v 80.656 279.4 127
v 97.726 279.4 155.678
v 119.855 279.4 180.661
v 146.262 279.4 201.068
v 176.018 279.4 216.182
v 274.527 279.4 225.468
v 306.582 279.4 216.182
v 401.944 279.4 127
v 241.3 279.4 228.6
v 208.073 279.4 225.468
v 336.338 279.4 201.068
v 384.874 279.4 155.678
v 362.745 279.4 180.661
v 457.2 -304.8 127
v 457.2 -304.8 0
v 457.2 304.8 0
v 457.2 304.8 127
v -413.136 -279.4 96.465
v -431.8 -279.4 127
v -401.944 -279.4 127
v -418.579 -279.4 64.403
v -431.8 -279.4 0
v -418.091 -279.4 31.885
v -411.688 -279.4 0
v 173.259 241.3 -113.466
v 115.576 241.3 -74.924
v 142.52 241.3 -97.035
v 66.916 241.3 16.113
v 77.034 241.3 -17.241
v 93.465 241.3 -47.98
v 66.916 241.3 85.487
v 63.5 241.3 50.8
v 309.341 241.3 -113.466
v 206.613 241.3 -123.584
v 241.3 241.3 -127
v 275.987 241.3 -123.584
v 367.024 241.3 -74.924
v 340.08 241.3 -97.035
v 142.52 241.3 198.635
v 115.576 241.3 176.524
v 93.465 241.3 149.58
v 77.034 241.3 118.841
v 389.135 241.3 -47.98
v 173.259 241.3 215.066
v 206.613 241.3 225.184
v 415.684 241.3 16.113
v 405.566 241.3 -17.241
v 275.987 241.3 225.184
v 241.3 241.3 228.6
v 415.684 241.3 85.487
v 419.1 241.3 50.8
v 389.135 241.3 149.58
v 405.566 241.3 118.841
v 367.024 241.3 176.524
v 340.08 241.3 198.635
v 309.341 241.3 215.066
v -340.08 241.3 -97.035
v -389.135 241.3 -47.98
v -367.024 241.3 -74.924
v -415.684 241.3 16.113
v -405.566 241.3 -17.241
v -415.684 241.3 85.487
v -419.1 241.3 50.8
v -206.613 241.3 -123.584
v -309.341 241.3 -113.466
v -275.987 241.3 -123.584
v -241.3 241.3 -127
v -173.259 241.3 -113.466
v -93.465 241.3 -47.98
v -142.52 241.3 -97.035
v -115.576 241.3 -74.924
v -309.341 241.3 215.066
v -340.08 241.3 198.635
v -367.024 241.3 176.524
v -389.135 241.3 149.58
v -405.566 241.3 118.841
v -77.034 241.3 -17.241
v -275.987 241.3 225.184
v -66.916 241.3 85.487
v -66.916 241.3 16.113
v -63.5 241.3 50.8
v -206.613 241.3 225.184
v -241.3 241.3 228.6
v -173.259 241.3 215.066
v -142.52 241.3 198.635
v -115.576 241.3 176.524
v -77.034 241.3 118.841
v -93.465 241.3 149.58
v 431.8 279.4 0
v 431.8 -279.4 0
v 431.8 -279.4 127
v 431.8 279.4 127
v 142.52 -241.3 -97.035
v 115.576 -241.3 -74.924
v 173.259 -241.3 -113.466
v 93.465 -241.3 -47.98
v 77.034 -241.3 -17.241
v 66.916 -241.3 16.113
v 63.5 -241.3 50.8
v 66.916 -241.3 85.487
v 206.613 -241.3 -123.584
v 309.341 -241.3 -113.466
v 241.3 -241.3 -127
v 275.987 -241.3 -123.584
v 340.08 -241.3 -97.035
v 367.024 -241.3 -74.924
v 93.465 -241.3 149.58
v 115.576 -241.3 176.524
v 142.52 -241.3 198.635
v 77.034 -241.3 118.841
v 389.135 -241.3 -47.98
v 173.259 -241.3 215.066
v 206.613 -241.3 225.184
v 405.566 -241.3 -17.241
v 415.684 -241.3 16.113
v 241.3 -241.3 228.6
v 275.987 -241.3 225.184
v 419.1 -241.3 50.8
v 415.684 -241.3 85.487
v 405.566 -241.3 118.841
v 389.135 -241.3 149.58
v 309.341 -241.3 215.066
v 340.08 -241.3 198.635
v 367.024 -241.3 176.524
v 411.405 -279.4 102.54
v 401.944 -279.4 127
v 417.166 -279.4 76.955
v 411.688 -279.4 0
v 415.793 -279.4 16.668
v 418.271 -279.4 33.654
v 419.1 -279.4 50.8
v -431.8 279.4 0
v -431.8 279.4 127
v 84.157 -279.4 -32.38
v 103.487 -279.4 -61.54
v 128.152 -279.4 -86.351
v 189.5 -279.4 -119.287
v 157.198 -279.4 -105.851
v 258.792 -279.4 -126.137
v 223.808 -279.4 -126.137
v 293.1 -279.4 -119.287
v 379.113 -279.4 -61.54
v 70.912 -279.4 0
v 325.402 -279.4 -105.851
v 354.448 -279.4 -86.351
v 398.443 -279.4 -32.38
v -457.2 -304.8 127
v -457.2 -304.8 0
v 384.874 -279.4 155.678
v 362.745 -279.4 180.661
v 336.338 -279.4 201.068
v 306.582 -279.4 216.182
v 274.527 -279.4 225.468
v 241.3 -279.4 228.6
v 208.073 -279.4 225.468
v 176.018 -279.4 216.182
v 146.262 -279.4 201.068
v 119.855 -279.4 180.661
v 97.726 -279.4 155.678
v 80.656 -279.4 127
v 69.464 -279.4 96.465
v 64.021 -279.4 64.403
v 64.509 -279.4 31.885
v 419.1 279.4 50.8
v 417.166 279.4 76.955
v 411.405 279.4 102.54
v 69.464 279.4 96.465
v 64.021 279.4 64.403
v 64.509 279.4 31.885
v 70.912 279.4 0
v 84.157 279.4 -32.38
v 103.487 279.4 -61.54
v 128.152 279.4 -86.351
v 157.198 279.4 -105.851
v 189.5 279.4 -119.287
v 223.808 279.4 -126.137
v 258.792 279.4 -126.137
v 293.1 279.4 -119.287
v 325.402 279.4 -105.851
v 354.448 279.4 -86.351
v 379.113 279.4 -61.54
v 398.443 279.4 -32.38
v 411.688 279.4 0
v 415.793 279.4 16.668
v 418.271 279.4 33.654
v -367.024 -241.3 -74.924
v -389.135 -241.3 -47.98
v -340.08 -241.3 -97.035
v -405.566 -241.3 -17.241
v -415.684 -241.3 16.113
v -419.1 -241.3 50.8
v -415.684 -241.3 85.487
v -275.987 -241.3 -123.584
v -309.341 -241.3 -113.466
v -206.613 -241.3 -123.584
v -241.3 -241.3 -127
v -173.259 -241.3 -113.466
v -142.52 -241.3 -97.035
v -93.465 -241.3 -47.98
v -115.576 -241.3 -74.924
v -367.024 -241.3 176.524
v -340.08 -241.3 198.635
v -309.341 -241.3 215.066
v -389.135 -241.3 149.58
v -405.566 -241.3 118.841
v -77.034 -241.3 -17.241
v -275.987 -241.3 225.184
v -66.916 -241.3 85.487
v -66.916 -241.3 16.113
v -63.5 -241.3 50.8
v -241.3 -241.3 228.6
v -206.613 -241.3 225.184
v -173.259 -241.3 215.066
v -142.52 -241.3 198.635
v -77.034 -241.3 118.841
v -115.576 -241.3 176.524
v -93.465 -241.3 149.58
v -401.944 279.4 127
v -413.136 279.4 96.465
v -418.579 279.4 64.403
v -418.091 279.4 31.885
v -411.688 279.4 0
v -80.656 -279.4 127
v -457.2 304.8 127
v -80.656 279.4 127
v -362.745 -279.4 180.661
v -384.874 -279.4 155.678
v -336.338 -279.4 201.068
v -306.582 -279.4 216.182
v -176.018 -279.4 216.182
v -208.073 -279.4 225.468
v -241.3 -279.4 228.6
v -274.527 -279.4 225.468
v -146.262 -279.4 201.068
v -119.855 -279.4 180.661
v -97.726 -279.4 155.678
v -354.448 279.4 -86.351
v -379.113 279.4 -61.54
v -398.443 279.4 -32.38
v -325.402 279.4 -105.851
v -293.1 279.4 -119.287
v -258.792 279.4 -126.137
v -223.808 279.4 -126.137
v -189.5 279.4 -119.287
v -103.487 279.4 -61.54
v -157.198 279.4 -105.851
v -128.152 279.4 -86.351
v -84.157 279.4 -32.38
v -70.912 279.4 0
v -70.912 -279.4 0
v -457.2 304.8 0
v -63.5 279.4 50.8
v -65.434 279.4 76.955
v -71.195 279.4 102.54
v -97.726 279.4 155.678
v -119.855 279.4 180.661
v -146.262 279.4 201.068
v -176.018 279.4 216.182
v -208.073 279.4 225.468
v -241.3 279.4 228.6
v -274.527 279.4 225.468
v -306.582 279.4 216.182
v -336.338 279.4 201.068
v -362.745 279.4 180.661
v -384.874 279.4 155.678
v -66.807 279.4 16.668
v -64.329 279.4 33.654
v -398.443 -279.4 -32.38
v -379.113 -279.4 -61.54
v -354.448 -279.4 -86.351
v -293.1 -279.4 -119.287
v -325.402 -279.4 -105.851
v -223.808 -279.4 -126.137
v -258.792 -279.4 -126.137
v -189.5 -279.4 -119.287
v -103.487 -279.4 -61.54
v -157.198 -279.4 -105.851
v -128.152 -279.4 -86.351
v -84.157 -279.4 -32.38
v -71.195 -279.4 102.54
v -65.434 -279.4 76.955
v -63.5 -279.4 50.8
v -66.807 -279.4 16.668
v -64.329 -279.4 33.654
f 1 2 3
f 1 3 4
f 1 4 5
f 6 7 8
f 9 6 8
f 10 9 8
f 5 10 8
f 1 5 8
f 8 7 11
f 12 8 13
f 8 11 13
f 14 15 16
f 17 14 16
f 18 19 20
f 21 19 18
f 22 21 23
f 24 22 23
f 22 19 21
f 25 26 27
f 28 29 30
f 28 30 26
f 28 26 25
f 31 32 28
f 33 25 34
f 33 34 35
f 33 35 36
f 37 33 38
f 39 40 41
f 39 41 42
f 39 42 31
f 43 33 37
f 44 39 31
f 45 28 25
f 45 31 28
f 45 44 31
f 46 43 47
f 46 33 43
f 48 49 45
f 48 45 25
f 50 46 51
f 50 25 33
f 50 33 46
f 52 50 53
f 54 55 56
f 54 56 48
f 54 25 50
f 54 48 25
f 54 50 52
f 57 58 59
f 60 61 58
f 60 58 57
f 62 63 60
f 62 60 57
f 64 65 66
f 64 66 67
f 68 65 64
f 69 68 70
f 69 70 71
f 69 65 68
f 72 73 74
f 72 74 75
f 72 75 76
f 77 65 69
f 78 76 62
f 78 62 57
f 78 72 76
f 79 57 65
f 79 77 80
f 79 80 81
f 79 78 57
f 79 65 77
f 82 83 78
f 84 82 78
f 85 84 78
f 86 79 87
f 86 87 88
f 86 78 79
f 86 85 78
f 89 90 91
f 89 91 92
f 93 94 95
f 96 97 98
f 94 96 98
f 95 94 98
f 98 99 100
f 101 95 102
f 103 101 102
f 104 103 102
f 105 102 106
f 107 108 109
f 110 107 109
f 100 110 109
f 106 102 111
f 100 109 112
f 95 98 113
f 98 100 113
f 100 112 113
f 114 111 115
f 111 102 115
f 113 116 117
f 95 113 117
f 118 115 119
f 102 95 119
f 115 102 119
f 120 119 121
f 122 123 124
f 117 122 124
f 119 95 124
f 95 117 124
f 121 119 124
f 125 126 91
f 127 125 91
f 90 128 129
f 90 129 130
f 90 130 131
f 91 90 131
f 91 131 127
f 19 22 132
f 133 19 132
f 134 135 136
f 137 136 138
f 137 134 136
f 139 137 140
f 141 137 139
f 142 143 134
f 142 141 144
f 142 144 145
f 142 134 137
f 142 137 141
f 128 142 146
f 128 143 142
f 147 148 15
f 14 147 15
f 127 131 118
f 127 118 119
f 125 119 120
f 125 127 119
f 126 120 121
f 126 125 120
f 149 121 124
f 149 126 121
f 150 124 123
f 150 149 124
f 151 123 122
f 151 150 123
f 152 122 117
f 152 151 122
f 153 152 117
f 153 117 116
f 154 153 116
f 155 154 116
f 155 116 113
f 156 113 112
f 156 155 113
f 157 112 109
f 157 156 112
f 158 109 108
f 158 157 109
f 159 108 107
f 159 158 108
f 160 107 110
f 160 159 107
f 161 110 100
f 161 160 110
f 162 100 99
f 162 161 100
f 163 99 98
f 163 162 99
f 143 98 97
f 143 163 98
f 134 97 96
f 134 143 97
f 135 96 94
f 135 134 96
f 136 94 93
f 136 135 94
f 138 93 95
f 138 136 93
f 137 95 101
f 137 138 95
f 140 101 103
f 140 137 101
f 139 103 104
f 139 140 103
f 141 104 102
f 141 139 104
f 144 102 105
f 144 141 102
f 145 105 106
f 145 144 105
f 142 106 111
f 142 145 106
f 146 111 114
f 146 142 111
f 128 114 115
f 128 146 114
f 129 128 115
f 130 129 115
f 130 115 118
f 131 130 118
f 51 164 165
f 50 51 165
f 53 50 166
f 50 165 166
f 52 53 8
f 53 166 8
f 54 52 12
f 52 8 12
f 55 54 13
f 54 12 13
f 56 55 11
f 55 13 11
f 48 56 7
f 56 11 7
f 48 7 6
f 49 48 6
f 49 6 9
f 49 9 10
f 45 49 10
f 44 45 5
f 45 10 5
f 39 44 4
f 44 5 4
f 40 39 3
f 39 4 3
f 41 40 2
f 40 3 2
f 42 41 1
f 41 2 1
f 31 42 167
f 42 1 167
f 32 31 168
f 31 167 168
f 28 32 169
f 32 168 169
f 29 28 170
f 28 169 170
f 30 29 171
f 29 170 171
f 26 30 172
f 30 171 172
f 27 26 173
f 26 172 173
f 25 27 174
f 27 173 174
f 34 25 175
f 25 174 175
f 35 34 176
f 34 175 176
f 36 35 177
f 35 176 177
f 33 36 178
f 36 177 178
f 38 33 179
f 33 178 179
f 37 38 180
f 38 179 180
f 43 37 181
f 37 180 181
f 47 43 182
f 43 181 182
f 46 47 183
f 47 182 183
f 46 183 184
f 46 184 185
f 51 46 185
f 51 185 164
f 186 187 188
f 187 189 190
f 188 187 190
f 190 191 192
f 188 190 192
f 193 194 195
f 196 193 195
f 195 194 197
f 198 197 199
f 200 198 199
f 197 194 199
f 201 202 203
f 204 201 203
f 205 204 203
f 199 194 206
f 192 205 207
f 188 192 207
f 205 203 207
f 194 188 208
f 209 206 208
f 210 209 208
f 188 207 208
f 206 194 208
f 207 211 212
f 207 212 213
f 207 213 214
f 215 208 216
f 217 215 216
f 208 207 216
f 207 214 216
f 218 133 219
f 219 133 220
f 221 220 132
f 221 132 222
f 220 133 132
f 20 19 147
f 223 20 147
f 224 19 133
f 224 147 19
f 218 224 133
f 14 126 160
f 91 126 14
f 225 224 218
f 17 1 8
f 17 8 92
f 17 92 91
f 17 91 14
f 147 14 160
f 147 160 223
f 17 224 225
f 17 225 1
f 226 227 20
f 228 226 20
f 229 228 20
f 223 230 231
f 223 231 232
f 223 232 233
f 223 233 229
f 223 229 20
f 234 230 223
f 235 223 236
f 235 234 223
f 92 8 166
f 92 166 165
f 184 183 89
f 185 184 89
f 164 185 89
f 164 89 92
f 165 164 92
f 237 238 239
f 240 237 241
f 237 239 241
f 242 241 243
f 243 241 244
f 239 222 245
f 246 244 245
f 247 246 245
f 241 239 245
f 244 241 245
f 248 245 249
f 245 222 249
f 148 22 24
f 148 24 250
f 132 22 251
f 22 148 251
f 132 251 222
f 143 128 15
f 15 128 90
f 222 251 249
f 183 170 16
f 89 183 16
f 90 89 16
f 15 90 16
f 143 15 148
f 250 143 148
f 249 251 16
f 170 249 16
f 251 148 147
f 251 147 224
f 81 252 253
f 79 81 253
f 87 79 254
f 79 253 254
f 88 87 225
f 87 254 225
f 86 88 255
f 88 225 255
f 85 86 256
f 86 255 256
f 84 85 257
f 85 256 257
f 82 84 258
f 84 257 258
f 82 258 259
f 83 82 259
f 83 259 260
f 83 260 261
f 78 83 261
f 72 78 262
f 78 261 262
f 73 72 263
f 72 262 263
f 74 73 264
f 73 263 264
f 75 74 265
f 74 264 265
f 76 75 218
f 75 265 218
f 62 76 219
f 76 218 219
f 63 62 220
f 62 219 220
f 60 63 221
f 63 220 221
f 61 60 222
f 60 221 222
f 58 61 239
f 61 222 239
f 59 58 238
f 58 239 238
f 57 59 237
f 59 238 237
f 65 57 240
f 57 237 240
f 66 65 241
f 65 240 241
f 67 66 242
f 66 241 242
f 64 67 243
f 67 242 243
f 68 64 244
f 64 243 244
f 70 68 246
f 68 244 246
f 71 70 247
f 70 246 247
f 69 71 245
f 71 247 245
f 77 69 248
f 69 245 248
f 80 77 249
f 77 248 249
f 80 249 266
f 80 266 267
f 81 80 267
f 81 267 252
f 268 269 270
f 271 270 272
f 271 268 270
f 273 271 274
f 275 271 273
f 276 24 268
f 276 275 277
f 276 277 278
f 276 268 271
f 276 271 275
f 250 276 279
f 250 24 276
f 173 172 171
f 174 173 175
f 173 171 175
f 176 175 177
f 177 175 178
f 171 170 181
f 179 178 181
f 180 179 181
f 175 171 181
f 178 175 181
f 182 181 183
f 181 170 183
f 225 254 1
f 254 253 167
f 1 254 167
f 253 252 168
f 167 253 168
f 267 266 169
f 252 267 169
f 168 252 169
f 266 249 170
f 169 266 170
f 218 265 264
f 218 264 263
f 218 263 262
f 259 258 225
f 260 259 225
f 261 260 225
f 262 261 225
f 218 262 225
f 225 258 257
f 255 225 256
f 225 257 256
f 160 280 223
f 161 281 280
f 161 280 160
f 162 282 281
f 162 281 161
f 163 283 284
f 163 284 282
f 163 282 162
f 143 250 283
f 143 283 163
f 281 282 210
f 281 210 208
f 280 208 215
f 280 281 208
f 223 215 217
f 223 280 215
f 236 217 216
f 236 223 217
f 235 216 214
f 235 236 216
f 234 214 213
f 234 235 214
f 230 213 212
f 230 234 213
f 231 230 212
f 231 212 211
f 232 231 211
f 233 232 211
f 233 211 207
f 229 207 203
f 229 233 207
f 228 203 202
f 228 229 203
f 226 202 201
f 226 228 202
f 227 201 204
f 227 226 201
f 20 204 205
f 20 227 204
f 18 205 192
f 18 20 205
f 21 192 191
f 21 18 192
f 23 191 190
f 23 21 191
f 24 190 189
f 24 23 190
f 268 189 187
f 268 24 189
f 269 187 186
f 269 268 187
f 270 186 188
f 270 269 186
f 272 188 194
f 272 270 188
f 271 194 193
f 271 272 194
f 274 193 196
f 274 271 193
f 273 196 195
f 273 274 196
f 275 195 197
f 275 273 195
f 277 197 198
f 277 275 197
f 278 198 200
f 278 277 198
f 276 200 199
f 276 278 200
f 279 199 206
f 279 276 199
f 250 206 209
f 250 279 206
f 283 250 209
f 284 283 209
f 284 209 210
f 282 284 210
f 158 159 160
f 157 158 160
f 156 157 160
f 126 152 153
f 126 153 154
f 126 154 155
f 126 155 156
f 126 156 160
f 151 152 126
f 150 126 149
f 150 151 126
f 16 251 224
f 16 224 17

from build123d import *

# Parameters (mm, degrees)
F0_W     = 914.4
F0_H     = 609.6
F0_W_2   = 863.6
F0_H_2   = 558.8
F1_DEPTH = 127
F2_R     = 177.8
F3_DEPTH = 38.1


with BuildPart() as f1:
    # F0 (on Top) → F1 (new body)
    with BuildSketch(Plane.XY):
        Rectangle(F0_W, F0_H)
        Rectangle(F0_W_2, F0_H_2, mode=Mode.SUBTRACT)
    extrude(amount=F1_DEPTH)

    # F2 (on face) → F3 (join)
    with BuildSketch(Plane.XZ.offset(-279.4)):
        with Locations((-241.3, 50.8)):
            Circle(F2_R)
        with Locations((241.3, 50.8)):
            Circle(F2_R)
    extrude(amount=F3_DEPTH)

    # F4: F1 across plane


with BuildPart() as f1_1:
    add(f1.part)
    add(f1.part.mirror(Plane.XZ))


solid = f1_1.part
